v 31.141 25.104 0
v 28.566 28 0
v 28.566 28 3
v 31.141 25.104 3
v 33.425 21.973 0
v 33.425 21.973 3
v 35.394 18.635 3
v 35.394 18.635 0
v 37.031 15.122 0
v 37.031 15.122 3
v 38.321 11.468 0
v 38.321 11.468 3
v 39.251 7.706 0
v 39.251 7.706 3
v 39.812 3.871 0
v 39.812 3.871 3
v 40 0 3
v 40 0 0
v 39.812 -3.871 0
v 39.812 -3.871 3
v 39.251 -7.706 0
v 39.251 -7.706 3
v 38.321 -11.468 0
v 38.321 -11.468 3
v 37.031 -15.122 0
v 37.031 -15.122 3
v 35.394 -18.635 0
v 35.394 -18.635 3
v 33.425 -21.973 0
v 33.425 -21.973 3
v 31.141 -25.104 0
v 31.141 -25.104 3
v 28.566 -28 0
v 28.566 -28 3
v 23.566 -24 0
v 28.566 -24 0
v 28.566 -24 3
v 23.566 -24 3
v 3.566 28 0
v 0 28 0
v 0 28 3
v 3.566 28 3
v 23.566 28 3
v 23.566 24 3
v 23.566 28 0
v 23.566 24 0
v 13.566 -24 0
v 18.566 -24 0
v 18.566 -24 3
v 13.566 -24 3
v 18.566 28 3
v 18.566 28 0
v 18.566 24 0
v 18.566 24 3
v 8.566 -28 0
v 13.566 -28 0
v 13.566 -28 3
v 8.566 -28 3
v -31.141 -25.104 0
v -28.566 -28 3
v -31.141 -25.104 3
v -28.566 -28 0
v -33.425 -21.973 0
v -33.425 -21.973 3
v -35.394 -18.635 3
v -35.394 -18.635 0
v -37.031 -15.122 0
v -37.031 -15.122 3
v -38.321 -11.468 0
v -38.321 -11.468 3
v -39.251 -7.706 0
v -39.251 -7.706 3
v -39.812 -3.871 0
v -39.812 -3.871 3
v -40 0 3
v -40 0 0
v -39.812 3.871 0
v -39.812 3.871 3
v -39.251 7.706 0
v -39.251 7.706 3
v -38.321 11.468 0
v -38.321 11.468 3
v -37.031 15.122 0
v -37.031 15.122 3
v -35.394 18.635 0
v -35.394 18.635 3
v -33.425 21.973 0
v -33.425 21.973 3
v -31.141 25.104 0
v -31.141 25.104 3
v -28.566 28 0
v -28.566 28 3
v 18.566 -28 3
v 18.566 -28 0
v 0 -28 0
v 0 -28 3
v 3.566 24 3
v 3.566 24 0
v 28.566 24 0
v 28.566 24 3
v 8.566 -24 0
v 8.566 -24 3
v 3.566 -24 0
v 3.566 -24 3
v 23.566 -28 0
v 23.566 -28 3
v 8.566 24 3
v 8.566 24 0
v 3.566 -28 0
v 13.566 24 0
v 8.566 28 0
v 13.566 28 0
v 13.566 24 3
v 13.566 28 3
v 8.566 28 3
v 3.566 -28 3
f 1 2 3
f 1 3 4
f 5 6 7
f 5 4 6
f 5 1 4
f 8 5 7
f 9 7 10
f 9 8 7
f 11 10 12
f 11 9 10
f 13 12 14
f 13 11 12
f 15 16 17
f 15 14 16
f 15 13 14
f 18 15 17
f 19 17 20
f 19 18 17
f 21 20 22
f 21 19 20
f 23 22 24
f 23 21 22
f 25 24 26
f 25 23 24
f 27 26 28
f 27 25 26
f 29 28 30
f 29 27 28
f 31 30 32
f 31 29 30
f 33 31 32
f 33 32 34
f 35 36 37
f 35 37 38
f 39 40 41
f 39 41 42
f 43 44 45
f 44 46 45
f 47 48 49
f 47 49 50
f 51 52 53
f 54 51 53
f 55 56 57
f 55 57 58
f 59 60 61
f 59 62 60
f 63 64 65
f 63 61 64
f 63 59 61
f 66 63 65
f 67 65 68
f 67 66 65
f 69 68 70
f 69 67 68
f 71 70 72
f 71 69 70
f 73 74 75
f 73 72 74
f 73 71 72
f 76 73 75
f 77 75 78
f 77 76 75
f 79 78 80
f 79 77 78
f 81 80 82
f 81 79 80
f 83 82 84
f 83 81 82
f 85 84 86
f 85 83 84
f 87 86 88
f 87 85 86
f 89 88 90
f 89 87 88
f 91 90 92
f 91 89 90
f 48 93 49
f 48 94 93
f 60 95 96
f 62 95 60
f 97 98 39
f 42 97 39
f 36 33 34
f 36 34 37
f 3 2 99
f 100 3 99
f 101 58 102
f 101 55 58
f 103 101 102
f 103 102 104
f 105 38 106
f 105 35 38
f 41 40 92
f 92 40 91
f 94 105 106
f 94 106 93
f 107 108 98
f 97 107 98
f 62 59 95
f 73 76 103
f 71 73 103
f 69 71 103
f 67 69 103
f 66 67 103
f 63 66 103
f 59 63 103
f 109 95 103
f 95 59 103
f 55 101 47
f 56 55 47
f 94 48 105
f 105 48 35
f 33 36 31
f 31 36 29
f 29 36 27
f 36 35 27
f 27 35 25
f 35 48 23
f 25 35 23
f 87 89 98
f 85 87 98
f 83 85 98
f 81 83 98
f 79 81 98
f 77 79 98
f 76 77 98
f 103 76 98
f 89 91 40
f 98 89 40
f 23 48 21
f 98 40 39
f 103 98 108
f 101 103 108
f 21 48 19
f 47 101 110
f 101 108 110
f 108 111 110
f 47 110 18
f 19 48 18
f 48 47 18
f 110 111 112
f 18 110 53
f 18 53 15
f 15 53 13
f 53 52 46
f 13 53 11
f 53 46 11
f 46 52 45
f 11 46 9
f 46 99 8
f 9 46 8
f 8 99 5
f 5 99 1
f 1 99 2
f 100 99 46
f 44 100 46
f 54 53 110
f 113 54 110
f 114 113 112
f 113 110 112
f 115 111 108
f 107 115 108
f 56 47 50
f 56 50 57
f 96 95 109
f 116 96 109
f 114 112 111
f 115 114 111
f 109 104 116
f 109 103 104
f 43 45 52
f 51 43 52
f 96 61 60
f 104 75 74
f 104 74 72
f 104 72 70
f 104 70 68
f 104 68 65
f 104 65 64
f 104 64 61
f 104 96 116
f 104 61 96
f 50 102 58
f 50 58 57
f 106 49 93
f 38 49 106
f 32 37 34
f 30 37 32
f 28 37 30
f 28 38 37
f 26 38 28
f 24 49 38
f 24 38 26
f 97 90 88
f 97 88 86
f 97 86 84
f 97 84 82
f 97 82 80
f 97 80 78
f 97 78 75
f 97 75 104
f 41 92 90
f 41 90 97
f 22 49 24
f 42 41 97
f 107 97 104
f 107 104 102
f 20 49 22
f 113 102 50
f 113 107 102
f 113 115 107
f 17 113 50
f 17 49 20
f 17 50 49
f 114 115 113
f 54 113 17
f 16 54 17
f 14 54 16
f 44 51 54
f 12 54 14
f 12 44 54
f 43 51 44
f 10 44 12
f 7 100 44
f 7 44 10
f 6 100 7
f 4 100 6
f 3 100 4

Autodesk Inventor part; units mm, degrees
ref_plane "YZ Plane" through (0, 0, 0) normal (1, 0, 0) x (0, 1, 0)
ref_plane "XZ Plane" through (0, 0, 0) normal (0, 1, 0) x (-1, 0, 0)
ref_plane "XY Plane" through (0, 0, 0) normal (0, 0, 1) x (1, 0, 0)
sketch "Sketch1" plane through (0, 0, 0) normal (0, 0, 1) x (1, 0, 0)
  line L0 (0, 28) -> (-28.5657, 28)
  line L1 (-42.7333, 0) -> (57.4636, 0) construction
  line L2 (0, -28) -> (-28.5657, -28)
  arc A0 (-28.5657, 28) -> (-28.5657, -28) centre (0, 0) ccw
  arc A1 (28.5657, -28) -> (28.5657, 28) centre (0, 0) ccw
  line L3 (28.5657, 28) -> (28.5657, 24)
  line L4 (28.5657, 24) -> (23.5657, 24)
  line L5 (23.5657, 24) -> (23.5657, 28)
  line L6 (23.5657, 28) -> (18.5657, 28)
  line L7 (18.5657, 28) -> (18.5657, 24)
  line L8 (18.5657, 24) -> (13.5657, 24)
  line L9 (13.5657, 24) -> (13.5657, 28)
  line L10 (13.5657, 28) -> (8.5657, 28)
  line L11 (8.5657, 28) -> (8.5657, 24)
  line L12 (8.5657, 24) -> (3.5657, 24)
  line L13 (3.5657, 24) -> (3.5657, 28)
  line L14 (0, 28) -> (3.5657, 28)
  line L15 (8.5657, 28) -> (13.5657, 28)
  line L16 (28.5657, -28) -> (28.5657, -24)
  line L17 (28.5657, -24) -> (23.5657, -24)
  line L18 (23.5657, -24) -> (23.5657, -28)
  line L19 (23.5657, -28) -> (18.5657, -28)
  line L20 (18.5657, -28) -> (18.5657, -24)
  line L21 (18.5657, -24) -> (13.5657, -24)
  line L22 (13.5657, -24) -> (13.5657, -28)
  line L23 (13.5657, -28) -> (8.5657, -28)
  line L24 (8.5657, -28) -> (8.5657, -24)
  line L25 (8.5657, -24) -> (3.5657, -24)
  line L26 (3.5657, -24) -> (3.5657, -28)
  line L27 (8.5657, -28) -> (13.5657, -28)
  line L28 (0, -28) -> (3.5657, -28)
  line L29 (8.5657, -28) -> (13.5657, -28)
  line L30 (18.5657, -28) -> (23.5657, -28)
  dimension "d2" = 40
  dimension "d3" = 40
  dimension "d4" = 4
  dimension "d9" = 5
  dimension "d17" = 4
  dimension "d18" = 4
  dimension "d20" = 4
  dimension "d21" = 4
extrude "Extrusion1" add sketch "Sketch1" along normal blind 3
equation "\"d3\" = d2"
equation "\"d17\" = d4"
equation "\"d18\" = d4"
equation "\"d20\" = d4"
equation "\"d21\" = d4"
properties part number "base"
